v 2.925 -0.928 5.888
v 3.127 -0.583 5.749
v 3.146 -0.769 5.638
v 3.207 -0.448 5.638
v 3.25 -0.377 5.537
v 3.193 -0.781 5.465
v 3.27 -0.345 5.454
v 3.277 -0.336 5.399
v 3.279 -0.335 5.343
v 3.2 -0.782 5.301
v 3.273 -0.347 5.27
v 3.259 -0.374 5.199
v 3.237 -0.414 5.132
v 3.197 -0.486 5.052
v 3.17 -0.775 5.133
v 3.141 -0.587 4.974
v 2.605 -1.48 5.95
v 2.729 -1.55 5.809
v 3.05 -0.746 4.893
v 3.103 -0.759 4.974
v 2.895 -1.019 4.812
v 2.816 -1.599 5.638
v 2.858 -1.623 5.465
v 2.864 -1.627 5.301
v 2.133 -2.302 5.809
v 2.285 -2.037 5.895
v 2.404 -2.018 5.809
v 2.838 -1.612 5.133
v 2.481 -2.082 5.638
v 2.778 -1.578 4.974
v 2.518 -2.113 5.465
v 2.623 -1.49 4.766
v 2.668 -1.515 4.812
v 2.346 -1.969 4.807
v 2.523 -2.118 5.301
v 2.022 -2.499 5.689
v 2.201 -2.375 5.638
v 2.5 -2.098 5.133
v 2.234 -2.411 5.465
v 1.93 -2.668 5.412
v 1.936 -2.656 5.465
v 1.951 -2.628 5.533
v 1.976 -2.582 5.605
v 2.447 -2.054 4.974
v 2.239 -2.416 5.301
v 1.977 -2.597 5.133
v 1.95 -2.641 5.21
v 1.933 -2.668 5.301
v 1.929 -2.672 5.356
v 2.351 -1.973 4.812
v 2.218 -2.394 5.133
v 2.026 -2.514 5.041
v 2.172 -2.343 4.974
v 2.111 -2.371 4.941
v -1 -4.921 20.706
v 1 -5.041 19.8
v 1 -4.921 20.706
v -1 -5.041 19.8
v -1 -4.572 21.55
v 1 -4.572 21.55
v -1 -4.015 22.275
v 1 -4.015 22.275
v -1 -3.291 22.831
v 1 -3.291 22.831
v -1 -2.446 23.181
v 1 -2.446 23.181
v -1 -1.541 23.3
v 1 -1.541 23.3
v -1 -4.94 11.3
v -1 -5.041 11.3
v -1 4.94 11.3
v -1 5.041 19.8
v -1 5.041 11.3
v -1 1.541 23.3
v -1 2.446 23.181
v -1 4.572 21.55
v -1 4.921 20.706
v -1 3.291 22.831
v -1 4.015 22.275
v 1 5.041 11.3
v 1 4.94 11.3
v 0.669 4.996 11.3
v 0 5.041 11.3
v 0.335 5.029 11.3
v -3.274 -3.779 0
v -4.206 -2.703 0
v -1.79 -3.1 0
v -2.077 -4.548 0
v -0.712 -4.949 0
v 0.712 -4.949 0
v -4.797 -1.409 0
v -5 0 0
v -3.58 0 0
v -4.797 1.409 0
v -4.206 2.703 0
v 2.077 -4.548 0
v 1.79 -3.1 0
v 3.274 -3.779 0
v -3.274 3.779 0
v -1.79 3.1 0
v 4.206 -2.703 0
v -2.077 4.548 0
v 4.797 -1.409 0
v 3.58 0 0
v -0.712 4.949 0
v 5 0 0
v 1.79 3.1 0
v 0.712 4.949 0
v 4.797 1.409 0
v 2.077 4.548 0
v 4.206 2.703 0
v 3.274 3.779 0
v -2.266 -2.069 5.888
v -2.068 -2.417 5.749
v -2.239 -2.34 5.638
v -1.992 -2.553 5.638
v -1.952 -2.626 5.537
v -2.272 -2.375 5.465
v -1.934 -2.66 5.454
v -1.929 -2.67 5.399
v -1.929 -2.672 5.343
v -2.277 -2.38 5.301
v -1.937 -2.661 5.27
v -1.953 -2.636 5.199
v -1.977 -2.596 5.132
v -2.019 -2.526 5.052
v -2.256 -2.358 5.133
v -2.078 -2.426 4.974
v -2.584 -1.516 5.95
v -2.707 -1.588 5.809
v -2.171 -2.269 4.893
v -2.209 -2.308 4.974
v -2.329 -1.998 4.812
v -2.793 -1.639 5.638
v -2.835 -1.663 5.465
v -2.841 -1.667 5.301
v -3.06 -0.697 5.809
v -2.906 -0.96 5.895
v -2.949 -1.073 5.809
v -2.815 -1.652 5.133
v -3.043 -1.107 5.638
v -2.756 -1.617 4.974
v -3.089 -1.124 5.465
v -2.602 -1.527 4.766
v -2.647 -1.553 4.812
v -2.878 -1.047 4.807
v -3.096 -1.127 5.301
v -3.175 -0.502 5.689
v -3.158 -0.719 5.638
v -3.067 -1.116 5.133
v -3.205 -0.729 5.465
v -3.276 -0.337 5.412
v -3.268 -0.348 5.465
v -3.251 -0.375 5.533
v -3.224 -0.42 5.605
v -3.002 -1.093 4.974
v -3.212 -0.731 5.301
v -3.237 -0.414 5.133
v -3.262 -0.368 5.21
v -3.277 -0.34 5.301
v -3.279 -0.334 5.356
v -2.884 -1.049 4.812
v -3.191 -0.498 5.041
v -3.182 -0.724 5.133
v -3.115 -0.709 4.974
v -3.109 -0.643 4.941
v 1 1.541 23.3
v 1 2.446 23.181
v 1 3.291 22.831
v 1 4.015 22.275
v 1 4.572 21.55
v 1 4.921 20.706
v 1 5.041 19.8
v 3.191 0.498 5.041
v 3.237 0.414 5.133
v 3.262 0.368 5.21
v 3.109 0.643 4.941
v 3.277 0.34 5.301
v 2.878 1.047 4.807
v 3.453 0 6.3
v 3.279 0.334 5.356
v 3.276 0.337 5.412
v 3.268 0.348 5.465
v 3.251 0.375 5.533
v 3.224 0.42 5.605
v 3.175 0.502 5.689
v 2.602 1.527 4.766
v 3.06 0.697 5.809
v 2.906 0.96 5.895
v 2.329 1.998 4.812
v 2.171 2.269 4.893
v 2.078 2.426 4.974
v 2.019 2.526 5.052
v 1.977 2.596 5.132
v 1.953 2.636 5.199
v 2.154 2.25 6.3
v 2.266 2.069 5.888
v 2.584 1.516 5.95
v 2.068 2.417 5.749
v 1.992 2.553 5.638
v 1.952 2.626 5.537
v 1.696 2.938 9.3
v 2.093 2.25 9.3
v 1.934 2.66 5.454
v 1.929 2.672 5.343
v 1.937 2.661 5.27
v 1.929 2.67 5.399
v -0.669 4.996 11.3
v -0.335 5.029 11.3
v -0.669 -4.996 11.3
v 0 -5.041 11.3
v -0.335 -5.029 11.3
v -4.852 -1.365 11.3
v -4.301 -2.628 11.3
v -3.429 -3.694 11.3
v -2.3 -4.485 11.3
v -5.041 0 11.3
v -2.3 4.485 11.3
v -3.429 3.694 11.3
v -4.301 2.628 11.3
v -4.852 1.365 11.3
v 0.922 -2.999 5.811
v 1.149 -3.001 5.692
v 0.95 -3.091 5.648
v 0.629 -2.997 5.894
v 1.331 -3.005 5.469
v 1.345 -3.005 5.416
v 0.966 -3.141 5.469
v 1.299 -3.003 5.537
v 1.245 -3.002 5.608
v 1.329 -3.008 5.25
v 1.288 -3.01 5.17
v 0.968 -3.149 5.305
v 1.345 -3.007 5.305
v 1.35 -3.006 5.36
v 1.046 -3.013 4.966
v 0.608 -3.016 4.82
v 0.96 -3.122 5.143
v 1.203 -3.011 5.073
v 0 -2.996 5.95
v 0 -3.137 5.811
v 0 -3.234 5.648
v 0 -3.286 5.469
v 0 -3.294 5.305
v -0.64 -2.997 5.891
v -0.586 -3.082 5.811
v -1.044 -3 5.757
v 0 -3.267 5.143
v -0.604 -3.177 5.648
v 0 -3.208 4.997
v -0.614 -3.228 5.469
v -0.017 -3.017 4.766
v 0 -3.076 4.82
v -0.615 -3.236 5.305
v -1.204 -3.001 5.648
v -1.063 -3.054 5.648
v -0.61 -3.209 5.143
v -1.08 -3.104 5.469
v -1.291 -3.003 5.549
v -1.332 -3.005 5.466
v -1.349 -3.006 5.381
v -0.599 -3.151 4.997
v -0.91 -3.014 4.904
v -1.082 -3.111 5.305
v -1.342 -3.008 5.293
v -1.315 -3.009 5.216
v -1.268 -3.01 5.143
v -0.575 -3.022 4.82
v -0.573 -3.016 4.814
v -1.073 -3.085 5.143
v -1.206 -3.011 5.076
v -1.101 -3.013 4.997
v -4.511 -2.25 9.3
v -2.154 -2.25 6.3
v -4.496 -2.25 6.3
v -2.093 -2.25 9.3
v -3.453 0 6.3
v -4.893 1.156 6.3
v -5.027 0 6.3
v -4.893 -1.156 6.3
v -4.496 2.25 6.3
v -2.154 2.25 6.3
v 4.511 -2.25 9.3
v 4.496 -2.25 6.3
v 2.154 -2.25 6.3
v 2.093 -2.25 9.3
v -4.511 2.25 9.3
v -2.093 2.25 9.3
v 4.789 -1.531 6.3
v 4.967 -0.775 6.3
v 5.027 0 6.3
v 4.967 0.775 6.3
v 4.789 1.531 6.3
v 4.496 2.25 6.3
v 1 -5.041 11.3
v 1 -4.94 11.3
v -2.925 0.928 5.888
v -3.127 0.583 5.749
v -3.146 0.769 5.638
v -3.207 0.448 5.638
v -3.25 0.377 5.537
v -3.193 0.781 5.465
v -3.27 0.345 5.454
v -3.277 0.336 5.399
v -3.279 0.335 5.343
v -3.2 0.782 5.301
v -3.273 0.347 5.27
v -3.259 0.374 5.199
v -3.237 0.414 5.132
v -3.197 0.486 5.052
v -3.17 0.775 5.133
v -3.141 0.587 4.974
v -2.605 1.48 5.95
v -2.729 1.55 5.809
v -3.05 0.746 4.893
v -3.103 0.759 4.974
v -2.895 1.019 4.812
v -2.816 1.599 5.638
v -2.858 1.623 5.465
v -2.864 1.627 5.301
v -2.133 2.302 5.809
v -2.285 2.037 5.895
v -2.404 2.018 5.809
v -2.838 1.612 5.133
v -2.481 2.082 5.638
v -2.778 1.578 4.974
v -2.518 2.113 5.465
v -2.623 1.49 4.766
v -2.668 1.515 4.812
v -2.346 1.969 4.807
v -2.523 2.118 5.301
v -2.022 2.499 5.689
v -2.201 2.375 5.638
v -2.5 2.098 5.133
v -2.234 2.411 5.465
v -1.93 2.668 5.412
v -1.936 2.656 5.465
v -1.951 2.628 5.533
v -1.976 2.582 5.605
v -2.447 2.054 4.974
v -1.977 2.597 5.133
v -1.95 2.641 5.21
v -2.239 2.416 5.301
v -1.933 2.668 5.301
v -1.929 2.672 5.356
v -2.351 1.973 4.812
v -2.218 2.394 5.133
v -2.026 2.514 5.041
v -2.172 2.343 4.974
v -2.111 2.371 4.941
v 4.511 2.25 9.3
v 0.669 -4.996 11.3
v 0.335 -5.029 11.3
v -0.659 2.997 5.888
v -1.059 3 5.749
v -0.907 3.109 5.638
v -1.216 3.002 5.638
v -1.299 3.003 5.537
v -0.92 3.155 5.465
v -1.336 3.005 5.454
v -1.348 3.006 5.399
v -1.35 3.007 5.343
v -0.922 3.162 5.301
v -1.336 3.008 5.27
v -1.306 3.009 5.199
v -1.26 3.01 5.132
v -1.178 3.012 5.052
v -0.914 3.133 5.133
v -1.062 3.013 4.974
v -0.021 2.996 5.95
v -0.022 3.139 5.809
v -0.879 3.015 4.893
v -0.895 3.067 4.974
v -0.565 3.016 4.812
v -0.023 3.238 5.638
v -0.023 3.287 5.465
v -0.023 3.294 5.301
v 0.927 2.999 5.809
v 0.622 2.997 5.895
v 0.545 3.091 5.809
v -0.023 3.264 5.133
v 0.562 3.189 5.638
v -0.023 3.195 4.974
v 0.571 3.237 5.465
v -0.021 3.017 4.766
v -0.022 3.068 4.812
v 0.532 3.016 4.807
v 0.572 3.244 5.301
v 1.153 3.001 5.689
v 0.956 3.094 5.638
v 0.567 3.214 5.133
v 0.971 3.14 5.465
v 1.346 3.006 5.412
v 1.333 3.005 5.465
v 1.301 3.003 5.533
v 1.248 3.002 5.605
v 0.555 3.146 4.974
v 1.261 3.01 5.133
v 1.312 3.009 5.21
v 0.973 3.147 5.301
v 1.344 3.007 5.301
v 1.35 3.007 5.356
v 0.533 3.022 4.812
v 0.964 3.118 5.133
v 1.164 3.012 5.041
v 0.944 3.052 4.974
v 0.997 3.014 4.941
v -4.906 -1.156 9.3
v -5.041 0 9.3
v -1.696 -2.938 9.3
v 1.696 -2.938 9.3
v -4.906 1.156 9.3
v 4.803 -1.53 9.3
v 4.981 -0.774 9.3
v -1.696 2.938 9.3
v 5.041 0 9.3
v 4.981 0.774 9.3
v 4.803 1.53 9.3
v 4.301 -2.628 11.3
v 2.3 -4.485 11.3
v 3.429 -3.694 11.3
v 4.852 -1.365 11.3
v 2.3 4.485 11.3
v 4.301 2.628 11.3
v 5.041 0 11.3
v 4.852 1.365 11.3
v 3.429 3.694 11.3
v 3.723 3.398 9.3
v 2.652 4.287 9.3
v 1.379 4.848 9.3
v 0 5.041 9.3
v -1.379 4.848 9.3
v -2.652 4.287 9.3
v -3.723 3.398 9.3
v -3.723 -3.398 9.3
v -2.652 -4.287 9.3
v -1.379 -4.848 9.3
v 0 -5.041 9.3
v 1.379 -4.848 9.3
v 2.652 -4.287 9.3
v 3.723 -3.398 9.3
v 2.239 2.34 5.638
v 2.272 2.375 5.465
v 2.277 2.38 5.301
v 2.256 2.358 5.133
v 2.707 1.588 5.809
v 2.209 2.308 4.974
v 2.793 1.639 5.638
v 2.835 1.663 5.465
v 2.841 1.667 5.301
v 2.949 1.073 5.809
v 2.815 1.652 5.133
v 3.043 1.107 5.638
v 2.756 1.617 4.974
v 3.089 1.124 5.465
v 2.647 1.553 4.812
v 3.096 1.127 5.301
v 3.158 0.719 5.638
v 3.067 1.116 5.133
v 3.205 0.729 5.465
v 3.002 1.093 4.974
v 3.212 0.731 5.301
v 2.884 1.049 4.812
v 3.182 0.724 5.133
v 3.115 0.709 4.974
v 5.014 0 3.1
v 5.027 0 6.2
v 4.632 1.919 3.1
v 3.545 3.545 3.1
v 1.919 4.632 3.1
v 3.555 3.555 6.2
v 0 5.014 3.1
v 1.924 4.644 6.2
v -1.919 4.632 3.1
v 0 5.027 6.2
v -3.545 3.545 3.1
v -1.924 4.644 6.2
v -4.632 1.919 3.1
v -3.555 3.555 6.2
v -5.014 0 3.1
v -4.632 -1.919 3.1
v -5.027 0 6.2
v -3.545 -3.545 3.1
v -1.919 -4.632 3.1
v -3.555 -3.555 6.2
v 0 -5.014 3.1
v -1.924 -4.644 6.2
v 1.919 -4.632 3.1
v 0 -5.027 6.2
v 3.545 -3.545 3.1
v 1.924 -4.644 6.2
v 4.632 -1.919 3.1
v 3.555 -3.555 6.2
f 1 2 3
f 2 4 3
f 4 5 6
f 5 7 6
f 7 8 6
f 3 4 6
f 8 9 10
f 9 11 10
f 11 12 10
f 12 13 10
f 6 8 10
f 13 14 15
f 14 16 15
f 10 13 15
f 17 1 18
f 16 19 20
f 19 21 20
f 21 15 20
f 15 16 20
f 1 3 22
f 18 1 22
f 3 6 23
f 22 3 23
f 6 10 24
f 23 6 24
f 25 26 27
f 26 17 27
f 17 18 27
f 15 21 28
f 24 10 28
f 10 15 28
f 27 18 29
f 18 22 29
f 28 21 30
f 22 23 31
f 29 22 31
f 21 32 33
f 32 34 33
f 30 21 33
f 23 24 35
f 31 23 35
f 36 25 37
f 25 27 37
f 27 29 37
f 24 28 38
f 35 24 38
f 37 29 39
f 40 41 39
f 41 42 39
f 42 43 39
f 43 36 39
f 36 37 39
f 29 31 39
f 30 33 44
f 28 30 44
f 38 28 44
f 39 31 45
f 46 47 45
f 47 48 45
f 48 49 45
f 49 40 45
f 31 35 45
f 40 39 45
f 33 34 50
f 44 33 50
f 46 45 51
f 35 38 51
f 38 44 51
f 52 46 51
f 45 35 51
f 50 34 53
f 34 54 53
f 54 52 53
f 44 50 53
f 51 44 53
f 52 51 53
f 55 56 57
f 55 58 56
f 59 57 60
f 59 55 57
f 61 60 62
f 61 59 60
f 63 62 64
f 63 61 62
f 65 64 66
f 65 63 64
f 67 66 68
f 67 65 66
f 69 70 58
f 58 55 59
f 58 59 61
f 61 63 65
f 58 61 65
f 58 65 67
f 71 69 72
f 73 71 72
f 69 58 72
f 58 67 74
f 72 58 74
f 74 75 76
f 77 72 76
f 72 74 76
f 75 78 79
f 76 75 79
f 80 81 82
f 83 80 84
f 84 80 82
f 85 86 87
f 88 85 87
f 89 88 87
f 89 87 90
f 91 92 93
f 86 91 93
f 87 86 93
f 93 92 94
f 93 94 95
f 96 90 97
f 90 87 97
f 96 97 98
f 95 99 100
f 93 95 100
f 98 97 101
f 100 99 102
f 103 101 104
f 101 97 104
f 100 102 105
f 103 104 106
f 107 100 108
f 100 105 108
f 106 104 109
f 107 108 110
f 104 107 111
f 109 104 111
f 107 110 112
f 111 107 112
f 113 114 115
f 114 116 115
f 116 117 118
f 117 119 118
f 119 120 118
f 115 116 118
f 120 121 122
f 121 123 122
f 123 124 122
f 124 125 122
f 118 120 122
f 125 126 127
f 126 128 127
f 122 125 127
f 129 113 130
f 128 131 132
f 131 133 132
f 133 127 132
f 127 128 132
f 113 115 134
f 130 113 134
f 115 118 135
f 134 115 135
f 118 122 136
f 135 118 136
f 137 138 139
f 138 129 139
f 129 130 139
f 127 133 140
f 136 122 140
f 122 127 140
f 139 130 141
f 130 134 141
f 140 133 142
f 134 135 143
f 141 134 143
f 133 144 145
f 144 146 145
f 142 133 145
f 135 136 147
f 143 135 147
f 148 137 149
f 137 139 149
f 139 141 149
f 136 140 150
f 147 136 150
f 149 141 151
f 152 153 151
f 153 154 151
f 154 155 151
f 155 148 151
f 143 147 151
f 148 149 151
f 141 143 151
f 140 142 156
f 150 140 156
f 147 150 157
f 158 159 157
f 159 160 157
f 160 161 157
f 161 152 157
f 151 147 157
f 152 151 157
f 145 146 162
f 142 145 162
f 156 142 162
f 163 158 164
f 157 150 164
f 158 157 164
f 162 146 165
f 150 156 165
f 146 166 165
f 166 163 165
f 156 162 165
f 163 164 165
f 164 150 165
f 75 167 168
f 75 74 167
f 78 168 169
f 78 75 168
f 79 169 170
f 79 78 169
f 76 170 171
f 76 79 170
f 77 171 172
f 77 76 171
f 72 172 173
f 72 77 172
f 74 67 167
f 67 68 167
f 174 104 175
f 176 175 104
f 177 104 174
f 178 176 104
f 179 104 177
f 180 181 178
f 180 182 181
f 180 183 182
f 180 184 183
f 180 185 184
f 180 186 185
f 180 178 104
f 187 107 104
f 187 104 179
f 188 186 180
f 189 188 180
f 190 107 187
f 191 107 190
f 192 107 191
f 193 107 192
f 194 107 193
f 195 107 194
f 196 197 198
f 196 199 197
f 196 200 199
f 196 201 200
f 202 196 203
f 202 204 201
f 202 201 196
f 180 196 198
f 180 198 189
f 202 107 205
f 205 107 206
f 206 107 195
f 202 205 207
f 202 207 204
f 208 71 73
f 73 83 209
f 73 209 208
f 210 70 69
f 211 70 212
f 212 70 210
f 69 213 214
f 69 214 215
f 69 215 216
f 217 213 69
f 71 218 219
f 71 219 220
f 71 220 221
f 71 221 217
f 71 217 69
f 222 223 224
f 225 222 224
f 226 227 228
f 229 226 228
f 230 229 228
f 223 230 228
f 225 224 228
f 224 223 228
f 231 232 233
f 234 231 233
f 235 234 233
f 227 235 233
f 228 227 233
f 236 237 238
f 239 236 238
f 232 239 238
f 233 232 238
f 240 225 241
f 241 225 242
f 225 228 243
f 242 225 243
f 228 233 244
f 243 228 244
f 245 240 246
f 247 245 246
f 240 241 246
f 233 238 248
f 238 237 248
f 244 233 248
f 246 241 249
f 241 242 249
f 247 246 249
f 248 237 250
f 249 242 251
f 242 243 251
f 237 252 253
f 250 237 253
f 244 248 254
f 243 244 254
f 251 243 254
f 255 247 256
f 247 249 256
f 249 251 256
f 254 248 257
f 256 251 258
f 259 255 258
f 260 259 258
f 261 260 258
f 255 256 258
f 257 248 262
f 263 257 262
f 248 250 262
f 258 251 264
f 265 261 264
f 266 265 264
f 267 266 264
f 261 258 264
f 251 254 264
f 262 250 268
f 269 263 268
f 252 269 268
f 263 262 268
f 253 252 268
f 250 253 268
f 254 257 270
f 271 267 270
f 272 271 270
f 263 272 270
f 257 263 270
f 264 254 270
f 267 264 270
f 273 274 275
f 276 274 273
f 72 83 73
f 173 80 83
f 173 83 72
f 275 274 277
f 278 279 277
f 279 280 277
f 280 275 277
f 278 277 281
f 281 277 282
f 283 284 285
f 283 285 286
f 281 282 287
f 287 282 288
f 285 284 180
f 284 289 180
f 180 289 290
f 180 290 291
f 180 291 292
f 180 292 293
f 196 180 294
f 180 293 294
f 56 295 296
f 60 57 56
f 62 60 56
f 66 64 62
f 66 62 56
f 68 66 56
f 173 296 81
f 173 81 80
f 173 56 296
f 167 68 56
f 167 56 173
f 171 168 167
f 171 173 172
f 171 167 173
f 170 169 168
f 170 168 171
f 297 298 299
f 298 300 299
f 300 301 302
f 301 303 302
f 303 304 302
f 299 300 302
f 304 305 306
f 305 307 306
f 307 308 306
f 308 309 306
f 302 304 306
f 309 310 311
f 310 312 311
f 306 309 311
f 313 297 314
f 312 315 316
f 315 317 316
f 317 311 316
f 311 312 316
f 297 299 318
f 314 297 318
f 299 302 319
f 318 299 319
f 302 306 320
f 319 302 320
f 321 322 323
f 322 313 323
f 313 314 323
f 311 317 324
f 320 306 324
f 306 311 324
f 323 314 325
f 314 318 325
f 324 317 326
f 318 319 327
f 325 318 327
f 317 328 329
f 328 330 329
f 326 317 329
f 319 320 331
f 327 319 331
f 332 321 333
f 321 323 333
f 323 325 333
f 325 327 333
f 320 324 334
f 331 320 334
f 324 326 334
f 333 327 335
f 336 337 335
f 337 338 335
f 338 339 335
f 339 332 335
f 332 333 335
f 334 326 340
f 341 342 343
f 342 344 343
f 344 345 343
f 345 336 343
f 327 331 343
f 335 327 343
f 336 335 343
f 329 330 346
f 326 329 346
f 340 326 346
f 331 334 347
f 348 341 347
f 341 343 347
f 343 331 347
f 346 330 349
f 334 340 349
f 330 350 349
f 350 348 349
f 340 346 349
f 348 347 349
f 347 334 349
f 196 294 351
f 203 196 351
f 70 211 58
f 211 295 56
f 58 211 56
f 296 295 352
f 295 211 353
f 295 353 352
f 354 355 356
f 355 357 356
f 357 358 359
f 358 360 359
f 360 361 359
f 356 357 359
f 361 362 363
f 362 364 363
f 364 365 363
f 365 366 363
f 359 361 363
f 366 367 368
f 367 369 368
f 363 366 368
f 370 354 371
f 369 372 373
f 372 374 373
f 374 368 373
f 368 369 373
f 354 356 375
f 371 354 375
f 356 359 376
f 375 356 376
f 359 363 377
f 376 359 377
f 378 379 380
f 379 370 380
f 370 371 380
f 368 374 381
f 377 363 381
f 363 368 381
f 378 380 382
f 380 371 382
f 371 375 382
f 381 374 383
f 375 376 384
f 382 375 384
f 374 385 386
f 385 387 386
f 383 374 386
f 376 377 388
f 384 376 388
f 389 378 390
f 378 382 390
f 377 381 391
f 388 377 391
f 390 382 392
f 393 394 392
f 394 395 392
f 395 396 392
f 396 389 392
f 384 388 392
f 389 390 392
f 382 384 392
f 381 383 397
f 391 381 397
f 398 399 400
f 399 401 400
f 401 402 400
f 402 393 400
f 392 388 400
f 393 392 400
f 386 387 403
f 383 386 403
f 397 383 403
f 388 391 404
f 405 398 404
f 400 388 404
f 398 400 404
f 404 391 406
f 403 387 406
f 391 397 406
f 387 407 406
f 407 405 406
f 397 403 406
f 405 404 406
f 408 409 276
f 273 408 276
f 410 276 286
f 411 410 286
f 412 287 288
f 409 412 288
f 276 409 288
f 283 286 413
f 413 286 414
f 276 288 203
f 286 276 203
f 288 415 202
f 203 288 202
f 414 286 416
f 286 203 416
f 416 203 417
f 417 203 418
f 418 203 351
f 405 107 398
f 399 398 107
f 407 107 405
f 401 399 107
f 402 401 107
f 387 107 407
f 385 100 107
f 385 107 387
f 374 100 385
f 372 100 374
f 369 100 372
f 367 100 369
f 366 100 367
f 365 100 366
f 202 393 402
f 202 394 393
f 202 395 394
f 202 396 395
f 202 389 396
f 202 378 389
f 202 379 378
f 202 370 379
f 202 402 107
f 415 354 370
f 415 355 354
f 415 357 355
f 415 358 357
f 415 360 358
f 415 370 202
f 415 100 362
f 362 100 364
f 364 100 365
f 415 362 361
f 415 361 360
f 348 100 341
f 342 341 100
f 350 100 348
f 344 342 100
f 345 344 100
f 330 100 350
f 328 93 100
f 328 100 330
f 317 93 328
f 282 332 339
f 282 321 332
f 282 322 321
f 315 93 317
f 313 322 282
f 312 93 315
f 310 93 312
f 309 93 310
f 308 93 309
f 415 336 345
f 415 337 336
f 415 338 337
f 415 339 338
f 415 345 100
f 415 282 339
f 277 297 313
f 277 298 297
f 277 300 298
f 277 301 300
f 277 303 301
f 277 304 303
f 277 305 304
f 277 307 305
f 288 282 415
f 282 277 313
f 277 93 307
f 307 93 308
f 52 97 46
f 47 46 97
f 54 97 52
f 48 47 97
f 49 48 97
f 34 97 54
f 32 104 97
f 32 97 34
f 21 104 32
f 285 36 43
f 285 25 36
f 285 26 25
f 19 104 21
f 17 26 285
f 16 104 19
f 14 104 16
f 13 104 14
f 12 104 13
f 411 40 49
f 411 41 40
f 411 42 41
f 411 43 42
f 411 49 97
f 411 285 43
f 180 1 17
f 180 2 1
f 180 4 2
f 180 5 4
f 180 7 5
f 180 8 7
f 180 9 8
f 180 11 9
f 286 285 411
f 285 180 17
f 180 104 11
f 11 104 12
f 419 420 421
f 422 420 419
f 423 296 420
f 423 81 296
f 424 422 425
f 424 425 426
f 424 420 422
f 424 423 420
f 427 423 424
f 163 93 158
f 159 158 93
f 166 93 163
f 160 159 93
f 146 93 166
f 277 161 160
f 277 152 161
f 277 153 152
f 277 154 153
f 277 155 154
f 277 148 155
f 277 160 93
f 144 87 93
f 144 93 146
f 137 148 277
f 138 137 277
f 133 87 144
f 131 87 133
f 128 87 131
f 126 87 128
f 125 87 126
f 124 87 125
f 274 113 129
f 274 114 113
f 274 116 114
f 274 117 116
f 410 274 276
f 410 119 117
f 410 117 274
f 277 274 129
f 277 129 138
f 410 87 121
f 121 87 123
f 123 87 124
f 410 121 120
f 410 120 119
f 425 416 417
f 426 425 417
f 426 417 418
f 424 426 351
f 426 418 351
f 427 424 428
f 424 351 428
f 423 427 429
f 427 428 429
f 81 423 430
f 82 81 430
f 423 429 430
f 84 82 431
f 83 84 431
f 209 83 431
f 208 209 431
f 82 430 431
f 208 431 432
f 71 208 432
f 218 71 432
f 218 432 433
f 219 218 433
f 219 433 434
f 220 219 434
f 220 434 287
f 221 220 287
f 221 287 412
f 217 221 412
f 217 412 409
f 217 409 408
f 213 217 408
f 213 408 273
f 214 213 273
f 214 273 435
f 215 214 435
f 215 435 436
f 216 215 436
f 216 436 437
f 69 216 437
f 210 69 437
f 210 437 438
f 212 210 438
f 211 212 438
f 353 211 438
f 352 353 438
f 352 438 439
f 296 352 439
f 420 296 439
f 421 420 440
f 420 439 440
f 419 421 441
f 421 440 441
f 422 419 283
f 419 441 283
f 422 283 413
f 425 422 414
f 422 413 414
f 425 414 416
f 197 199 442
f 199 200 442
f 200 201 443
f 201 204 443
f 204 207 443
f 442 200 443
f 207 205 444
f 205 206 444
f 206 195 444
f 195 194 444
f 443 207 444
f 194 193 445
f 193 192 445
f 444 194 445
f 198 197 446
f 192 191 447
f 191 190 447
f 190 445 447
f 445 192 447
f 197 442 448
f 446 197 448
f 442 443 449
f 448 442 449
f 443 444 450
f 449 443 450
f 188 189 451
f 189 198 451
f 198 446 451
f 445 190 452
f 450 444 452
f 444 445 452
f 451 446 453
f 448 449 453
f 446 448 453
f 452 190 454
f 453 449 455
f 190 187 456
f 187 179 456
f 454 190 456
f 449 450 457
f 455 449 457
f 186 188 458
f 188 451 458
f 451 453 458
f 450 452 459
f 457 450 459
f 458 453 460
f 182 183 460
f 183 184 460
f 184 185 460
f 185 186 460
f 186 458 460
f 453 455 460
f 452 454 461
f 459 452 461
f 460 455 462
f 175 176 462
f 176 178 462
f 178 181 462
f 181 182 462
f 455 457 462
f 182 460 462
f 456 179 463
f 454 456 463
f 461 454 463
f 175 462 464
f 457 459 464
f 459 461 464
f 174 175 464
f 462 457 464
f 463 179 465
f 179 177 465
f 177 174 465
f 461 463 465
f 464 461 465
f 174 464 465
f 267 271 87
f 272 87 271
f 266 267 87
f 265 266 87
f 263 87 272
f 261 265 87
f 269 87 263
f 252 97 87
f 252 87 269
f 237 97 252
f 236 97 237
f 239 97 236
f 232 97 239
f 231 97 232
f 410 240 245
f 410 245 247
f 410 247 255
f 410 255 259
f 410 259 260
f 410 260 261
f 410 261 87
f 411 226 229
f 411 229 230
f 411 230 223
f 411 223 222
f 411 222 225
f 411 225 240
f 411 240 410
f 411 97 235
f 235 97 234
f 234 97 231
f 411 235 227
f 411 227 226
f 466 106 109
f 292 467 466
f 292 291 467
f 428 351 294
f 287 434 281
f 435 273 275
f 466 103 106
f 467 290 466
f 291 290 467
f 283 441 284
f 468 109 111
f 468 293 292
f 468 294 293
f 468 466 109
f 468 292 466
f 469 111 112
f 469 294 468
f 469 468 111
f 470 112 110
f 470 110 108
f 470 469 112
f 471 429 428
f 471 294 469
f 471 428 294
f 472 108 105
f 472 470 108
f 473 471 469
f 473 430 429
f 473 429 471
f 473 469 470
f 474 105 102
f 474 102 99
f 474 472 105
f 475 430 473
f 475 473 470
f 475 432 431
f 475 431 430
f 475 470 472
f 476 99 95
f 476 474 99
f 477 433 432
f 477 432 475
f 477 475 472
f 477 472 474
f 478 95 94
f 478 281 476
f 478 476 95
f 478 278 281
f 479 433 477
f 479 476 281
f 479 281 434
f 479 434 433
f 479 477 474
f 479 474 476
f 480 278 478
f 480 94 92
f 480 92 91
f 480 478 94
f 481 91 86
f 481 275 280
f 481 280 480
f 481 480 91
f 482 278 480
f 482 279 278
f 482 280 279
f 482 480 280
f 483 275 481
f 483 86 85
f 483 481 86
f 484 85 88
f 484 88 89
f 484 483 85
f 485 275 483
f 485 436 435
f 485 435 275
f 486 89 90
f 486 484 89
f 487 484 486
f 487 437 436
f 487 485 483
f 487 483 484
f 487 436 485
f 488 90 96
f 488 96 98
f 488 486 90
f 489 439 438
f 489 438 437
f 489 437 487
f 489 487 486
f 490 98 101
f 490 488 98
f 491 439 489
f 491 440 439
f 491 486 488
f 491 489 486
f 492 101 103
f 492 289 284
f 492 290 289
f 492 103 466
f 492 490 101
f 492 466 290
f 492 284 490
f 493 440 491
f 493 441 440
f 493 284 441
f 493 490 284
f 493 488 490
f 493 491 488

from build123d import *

# Parameters (mm, degrees)
F0_R      = 5
F1_DEPTH  = 9.3
F1_TAPER  = -0.25
F3_DEPTH  = 9.3
F3_TAPER  = 1
F4_R      = 0.75
F6_W      = 4.5
F6_H      = 3
F7_DEPTH  = 7.2
F8_R      = 5.0405791626
F9_DEPTH  = 2
F10_W     = 10.0811583253
F10_H     = 12
F11_DEPTH = 1
F12_R     = 3.5


with BuildPart() as f1:
    # F0 (on Top) → F1 (new body)
    with BuildSketch(Plane.XY):
        Circle(F0_R)
        Polygon((1.7897858345, 3.1), (3.579571669, 0), (1.7897858345, -3.1), (-1.7897858345, -3.1), (-3.579571669, 0), (-1.7897858345, 3.1), align=None, mode=Mode.SUBTRACT)
        Polygon((1.7897858345, -3.1), (3.579571669, 0), (1.7897858345, 3.1), (-1.7897858345, 3.1), (-3.579571669, 0), (-1.7897858345, -3.1), align=None)
    extrude(amount=F1_DEPTH, taper=F1_TAPER)

    # F2 (on Top) → F3 (cut)
    with BuildSketch(Plane.XY):
        Polygon((1.7897858345, -3.1), (3.579571669, 0), (1.7897858345, 3.1), (-1.7897858345, 3.1), (-3.579571669, 0), (-1.7897858345, -3.1), align=None)
    extrude(amount=F3_DEPTH, taper=F3_TAPER, mode=Mode.SUBTRACT)

    # F4 (on Right) → F5 (revolve, cut)
    with BuildSketch(Plane.YZ):
        with Locations((-2.5457434822, 5.35)):
            Circle(F4_R)
    revolve(axis=Axis((0, 0, 4.7348800581), (0, 0, -1)), mode=Mode.SUBTRACT)

    # F6 (on Right) → F7 (cut, symmetric)
    with BuildSketch(Plane.YZ):
        with Locations((0, 7.8)):
            Rectangle(F6_W, F6_H)
    extrude(amount=F7_DEPTH, both=True, mode=Mode.SUBTRACT)

    # F8 (on face) → F9 (join)
    with BuildSketch(Plane.XY.offset(9.3)):
        Circle(F8_R)
    extrude(amount=F9_DEPTH)

    # F10 (on Right) → F11 (join, symmetric)
    with BuildSketch(Plane.YZ):
        with Locations((0, 17.3)):
            Rectangle(F10_W, F10_H)
    extrude(amount=F11_DEPTH, both=True)

    # F12
    f12_edges = [f1.edges().sort_by_distance(p)[0] for p in [
        (0, -5.040579, 23.3),
        (0, 5.040579, 23.3),
    ]]
    fillet(f12_edges, radius=F12_R)


solid = f1.part
